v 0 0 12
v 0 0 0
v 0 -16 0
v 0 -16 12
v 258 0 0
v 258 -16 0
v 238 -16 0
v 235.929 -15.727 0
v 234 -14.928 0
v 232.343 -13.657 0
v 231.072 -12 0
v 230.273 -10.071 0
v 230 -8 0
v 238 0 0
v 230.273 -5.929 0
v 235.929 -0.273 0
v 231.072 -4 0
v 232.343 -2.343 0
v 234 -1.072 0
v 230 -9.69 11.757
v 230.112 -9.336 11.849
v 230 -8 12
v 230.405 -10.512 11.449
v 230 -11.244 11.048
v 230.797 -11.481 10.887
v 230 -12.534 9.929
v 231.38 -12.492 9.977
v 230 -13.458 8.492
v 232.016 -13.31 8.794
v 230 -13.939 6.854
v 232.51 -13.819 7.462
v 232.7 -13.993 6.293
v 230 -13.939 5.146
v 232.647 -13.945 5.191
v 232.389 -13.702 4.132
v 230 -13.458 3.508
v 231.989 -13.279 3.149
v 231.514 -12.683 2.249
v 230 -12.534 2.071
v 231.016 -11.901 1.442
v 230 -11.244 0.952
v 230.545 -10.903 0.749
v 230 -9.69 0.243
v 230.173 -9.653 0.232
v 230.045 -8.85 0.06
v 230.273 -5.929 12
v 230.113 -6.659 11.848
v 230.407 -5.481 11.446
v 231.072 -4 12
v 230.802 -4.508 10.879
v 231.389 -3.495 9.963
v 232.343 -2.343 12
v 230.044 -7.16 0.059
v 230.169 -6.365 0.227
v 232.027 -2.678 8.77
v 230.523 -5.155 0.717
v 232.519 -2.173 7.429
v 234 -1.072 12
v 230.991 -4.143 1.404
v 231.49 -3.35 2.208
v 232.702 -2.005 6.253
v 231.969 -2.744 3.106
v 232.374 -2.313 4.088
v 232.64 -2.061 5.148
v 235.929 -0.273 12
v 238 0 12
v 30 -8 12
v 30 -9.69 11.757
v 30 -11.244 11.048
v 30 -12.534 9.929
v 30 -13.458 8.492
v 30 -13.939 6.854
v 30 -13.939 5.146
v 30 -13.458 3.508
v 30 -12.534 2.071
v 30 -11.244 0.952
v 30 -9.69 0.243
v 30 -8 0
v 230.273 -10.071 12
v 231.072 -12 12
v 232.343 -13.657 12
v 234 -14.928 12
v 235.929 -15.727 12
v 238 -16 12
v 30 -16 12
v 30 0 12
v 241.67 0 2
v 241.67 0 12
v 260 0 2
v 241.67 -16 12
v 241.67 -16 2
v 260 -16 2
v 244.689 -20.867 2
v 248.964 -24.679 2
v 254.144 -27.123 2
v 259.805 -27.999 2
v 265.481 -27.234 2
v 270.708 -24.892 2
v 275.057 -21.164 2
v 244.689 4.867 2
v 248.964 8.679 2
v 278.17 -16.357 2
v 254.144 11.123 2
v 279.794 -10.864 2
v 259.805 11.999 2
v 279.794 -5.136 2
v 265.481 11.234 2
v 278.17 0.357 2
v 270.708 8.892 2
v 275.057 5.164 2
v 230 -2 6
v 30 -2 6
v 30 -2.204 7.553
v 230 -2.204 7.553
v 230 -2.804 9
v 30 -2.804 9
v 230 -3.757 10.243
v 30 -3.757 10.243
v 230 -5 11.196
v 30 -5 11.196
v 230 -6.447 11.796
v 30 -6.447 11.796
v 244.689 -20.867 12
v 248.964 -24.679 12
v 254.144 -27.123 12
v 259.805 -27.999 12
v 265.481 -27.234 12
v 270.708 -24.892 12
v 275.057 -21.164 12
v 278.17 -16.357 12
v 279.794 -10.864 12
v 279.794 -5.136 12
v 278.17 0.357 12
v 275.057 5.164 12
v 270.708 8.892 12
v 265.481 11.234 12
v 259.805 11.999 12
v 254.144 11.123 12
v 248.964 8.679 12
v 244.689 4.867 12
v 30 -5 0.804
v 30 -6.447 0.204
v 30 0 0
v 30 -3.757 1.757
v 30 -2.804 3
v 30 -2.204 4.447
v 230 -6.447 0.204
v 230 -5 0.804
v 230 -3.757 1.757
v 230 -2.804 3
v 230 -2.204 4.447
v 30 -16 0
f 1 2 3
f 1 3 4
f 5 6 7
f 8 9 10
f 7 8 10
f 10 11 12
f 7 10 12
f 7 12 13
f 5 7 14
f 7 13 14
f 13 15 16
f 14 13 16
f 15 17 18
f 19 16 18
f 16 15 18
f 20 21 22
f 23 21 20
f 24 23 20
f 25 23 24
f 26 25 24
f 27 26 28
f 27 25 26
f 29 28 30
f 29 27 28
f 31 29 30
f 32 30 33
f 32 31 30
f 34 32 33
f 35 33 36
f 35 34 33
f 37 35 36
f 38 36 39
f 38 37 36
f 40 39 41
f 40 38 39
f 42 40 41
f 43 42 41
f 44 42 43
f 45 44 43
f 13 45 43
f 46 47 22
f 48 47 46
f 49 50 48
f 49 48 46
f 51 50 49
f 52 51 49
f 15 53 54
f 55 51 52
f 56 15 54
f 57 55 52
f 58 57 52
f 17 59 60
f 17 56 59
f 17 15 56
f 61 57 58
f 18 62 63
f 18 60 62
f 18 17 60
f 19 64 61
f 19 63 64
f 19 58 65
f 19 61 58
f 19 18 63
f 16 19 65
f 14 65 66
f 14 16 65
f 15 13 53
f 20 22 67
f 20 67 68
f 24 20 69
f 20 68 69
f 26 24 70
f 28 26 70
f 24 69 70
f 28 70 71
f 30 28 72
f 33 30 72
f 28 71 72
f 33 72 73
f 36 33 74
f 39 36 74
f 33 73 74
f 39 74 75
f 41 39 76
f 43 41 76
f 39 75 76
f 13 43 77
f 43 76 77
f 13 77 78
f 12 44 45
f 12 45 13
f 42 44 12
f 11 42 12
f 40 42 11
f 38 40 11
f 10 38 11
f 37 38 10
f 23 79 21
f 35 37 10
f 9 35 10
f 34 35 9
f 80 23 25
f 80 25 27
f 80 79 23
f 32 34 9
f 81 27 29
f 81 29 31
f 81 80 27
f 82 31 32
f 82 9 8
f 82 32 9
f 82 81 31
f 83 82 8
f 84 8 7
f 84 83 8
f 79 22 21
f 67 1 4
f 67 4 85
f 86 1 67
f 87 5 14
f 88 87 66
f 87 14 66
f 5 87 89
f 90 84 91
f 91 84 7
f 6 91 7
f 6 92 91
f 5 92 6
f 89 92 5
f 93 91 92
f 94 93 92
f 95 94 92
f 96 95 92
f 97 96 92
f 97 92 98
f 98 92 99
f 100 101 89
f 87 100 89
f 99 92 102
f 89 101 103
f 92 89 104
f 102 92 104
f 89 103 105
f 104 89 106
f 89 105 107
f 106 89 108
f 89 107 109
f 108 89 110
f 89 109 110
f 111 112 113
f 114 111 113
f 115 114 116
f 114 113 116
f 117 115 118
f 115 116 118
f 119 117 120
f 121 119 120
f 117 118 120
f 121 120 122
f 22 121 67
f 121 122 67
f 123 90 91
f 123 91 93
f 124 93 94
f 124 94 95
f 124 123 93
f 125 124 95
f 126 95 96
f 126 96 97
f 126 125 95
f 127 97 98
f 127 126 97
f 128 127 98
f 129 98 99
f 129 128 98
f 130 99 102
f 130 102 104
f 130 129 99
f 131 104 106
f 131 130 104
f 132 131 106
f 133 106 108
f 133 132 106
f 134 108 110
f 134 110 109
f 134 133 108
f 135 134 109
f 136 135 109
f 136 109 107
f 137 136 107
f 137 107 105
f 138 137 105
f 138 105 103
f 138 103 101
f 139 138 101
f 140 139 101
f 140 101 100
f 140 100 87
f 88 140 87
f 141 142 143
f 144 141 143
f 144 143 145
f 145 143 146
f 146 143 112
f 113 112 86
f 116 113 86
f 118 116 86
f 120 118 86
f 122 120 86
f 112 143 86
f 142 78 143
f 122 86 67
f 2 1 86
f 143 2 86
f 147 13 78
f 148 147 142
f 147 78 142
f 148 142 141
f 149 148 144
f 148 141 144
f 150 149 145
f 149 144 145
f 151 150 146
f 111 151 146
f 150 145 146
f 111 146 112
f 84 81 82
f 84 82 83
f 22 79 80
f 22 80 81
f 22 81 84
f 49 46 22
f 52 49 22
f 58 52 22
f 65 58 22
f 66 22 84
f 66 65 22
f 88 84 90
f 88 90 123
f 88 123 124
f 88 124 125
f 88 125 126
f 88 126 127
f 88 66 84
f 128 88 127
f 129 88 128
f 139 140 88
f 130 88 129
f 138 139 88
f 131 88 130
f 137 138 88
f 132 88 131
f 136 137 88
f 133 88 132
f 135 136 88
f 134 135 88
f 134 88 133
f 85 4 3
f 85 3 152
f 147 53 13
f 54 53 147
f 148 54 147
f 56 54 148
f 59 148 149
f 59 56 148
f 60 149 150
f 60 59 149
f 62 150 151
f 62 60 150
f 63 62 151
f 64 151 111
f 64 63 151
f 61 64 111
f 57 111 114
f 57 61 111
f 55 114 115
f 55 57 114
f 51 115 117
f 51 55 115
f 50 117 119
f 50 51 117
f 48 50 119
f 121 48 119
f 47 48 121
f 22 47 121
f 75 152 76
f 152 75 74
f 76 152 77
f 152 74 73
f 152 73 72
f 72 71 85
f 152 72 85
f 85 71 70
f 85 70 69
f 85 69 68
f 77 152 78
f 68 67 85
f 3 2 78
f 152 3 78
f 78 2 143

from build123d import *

# Parameters (mm, degrees)
F0_W         = 30
F0_H         = 12
F1_DEPTH     = 16
F3_DEPTH     = 200
F5_DEPTH     = 30
F7_DEPTH     = 10
F8_T4_DEPTH  = 52
F8_S5_R      = 6
F8_T6_DEPTH  = 28
F8_T10_DEPTH = 52
F8_S11_R     = 6
F8_T12_DEPTH = 28
F9_SIZE      = 1.99999


# Not quite as in the source:
# - a fillet or chamfer that OpenCascade refuses, or shapes differently, is made with other operations: its cross-section is extruded or revolved along the edge and cut away or added
# - a fillet or chamfer is up to 0.001 mm smaller than in the source, because OpenCascade refuses the exact size


with BuildPart() as f1:
    # F0 (on Front) → F1 (new body)
    with BuildSketch(Plane.XZ):
        with Locations((15, 6)):
            Rectangle(F0_W, F0_H)
    extrude(amount=F1_DEPTH)

    # F2 (on face) → F3 (join)
    with BuildSketch(Plane.YZ.offset(30)):
        with BuildLine():
            ThreePointArc((-8, 0), (-3.7573593129, 1.7573593129), (-2, 6))
            ThreePointArc((-2, 6), (-3.7573593129, 10.2426406871), (-8, 12))
            ThreePointArc((-8, 12), (-14, 6), (-8, 0))
        make_face()
    extrude(amount=F3_DEPTH)

    # F4 (on face) → F5 (join)
    with BuildSketch(Plane.YZ.offset(230)):
        with BuildLine():
            Line((-8, 12), (-16, 12))
            Line((-16, 12), (-16, 0))
            Line((-16, 0), (-8, 0))
            ThreePointArc((-8, 0), (-14, 6), (-8, 12))
        make_face()
        with BuildLine():
            Line((0, 12), (-8, 12))
            ThreePointArc((-8, 12), (-3.7573593129, 10.2426406871), (-2, 6))
            ThreePointArc((-2, 6), (-3.7573593129, 1.7573593129), (-8, 0))
            Line((-8, 0), (0, 0))
            Line((0, 0), (0, 12))
        make_face()
        with BuildLine():
            ThreePointArc((-2, 6), (-3.7573593129, 10.2426406871), (-8, 12))
            ThreePointArc((-8, 12), (-14, 6), (-8, 0))
            ThreePointArc((-8, 0), (-3.7573593129, 1.7573593129), (-2, 6))
        make_face()
    extrude(amount=F5_DEPTH)

    # F6 (on face) → F7 (join)
    with BuildSketch(Plane.XY.offset(12)):
        with BuildLine():
            ThreePointArc((241.6696972202, -16), (264.0861928738, -27.5781262586), (280, -8))
            ThreePointArc((280, -8), (264.0861928738, 11.5781262586), (241.6696972202, 0))
            Line((241.6696972202, 0), (260, 0))
            Line((260, 0), (260, -16))
            Line((260, -16), (241.6696972202, -16))
        make_face()
    extrude(amount=-F7_DEPTH)

    # F8: fillet of radius 8 on 2 edges, made by hand


with BuildPart() as f8_tool2:
    # F8_s3 → F8_t4 (new body)
    with BuildSketch(Plane.XY.offset(-20)):
        with BuildLine():
            ThreePointArc((230, -8), (232.3431457505, -2.3431457505), (238, 0))
            Line((238, 0), (230, 0))
            Line((230, 0), (230, -8))
        make_face()
    extrude(amount=F8_T4_DEPTH)

    # F8_s5 → F8_t6 (cut, symmetric)
    with BuildSketch(Plane.YZ.offset(234)):
        with Locations((-8, 6)):
            Circle(F8_S5_R)
    extrude(amount=F8_T6_DEPTH, both=True, mode=Mode.SUBTRACT)


with BuildPart() as f1_1:
    add(f1.part)

    # F8_t1: cut F8_tool2
    add(f8_tool2.part, mode=Mode.SUBTRACT)


with BuildPart() as f8_tool8:
    # F8_s9 → F8_t10 (new body)
    with BuildSketch(Plane.XY.offset(32)):
        with BuildLine():
            ThreePointArc((230, -8), (232.3431457505, -13.6568542495), (238, -16))
            Line((238, -16), (230, -16))
            Line((230, -16), (230, -8))
        make_face()
    extrude(amount=-F8_T10_DEPTH)

    # F8_s11 → F8_t12 (cut, symmetric)
    with BuildSketch(Plane.YZ.offset(234)):
        with Locations((-8, 6)):
            Circle(F8_S11_R)
    extrude(amount=F8_T12_DEPTH, both=True, mode=Mode.SUBTRACT)


with BuildPart() as f1_2:
    add(f1_1.part)

    # F8_t7: cut F8_tool8
    add(f8_tool8.part, mode=Mode.SUBTRACT)

    # F9 (size 2 in the source; OpenCascade refuses exactly that, so slightly less here)
    f9_edges = [f1_2.edges().sort_by_distance(p)[0] for p in [
        (260, -8, 0),
    ]]
    chamfer(f9_edges, length=F9_SIZE)


solid = f1_2.part
